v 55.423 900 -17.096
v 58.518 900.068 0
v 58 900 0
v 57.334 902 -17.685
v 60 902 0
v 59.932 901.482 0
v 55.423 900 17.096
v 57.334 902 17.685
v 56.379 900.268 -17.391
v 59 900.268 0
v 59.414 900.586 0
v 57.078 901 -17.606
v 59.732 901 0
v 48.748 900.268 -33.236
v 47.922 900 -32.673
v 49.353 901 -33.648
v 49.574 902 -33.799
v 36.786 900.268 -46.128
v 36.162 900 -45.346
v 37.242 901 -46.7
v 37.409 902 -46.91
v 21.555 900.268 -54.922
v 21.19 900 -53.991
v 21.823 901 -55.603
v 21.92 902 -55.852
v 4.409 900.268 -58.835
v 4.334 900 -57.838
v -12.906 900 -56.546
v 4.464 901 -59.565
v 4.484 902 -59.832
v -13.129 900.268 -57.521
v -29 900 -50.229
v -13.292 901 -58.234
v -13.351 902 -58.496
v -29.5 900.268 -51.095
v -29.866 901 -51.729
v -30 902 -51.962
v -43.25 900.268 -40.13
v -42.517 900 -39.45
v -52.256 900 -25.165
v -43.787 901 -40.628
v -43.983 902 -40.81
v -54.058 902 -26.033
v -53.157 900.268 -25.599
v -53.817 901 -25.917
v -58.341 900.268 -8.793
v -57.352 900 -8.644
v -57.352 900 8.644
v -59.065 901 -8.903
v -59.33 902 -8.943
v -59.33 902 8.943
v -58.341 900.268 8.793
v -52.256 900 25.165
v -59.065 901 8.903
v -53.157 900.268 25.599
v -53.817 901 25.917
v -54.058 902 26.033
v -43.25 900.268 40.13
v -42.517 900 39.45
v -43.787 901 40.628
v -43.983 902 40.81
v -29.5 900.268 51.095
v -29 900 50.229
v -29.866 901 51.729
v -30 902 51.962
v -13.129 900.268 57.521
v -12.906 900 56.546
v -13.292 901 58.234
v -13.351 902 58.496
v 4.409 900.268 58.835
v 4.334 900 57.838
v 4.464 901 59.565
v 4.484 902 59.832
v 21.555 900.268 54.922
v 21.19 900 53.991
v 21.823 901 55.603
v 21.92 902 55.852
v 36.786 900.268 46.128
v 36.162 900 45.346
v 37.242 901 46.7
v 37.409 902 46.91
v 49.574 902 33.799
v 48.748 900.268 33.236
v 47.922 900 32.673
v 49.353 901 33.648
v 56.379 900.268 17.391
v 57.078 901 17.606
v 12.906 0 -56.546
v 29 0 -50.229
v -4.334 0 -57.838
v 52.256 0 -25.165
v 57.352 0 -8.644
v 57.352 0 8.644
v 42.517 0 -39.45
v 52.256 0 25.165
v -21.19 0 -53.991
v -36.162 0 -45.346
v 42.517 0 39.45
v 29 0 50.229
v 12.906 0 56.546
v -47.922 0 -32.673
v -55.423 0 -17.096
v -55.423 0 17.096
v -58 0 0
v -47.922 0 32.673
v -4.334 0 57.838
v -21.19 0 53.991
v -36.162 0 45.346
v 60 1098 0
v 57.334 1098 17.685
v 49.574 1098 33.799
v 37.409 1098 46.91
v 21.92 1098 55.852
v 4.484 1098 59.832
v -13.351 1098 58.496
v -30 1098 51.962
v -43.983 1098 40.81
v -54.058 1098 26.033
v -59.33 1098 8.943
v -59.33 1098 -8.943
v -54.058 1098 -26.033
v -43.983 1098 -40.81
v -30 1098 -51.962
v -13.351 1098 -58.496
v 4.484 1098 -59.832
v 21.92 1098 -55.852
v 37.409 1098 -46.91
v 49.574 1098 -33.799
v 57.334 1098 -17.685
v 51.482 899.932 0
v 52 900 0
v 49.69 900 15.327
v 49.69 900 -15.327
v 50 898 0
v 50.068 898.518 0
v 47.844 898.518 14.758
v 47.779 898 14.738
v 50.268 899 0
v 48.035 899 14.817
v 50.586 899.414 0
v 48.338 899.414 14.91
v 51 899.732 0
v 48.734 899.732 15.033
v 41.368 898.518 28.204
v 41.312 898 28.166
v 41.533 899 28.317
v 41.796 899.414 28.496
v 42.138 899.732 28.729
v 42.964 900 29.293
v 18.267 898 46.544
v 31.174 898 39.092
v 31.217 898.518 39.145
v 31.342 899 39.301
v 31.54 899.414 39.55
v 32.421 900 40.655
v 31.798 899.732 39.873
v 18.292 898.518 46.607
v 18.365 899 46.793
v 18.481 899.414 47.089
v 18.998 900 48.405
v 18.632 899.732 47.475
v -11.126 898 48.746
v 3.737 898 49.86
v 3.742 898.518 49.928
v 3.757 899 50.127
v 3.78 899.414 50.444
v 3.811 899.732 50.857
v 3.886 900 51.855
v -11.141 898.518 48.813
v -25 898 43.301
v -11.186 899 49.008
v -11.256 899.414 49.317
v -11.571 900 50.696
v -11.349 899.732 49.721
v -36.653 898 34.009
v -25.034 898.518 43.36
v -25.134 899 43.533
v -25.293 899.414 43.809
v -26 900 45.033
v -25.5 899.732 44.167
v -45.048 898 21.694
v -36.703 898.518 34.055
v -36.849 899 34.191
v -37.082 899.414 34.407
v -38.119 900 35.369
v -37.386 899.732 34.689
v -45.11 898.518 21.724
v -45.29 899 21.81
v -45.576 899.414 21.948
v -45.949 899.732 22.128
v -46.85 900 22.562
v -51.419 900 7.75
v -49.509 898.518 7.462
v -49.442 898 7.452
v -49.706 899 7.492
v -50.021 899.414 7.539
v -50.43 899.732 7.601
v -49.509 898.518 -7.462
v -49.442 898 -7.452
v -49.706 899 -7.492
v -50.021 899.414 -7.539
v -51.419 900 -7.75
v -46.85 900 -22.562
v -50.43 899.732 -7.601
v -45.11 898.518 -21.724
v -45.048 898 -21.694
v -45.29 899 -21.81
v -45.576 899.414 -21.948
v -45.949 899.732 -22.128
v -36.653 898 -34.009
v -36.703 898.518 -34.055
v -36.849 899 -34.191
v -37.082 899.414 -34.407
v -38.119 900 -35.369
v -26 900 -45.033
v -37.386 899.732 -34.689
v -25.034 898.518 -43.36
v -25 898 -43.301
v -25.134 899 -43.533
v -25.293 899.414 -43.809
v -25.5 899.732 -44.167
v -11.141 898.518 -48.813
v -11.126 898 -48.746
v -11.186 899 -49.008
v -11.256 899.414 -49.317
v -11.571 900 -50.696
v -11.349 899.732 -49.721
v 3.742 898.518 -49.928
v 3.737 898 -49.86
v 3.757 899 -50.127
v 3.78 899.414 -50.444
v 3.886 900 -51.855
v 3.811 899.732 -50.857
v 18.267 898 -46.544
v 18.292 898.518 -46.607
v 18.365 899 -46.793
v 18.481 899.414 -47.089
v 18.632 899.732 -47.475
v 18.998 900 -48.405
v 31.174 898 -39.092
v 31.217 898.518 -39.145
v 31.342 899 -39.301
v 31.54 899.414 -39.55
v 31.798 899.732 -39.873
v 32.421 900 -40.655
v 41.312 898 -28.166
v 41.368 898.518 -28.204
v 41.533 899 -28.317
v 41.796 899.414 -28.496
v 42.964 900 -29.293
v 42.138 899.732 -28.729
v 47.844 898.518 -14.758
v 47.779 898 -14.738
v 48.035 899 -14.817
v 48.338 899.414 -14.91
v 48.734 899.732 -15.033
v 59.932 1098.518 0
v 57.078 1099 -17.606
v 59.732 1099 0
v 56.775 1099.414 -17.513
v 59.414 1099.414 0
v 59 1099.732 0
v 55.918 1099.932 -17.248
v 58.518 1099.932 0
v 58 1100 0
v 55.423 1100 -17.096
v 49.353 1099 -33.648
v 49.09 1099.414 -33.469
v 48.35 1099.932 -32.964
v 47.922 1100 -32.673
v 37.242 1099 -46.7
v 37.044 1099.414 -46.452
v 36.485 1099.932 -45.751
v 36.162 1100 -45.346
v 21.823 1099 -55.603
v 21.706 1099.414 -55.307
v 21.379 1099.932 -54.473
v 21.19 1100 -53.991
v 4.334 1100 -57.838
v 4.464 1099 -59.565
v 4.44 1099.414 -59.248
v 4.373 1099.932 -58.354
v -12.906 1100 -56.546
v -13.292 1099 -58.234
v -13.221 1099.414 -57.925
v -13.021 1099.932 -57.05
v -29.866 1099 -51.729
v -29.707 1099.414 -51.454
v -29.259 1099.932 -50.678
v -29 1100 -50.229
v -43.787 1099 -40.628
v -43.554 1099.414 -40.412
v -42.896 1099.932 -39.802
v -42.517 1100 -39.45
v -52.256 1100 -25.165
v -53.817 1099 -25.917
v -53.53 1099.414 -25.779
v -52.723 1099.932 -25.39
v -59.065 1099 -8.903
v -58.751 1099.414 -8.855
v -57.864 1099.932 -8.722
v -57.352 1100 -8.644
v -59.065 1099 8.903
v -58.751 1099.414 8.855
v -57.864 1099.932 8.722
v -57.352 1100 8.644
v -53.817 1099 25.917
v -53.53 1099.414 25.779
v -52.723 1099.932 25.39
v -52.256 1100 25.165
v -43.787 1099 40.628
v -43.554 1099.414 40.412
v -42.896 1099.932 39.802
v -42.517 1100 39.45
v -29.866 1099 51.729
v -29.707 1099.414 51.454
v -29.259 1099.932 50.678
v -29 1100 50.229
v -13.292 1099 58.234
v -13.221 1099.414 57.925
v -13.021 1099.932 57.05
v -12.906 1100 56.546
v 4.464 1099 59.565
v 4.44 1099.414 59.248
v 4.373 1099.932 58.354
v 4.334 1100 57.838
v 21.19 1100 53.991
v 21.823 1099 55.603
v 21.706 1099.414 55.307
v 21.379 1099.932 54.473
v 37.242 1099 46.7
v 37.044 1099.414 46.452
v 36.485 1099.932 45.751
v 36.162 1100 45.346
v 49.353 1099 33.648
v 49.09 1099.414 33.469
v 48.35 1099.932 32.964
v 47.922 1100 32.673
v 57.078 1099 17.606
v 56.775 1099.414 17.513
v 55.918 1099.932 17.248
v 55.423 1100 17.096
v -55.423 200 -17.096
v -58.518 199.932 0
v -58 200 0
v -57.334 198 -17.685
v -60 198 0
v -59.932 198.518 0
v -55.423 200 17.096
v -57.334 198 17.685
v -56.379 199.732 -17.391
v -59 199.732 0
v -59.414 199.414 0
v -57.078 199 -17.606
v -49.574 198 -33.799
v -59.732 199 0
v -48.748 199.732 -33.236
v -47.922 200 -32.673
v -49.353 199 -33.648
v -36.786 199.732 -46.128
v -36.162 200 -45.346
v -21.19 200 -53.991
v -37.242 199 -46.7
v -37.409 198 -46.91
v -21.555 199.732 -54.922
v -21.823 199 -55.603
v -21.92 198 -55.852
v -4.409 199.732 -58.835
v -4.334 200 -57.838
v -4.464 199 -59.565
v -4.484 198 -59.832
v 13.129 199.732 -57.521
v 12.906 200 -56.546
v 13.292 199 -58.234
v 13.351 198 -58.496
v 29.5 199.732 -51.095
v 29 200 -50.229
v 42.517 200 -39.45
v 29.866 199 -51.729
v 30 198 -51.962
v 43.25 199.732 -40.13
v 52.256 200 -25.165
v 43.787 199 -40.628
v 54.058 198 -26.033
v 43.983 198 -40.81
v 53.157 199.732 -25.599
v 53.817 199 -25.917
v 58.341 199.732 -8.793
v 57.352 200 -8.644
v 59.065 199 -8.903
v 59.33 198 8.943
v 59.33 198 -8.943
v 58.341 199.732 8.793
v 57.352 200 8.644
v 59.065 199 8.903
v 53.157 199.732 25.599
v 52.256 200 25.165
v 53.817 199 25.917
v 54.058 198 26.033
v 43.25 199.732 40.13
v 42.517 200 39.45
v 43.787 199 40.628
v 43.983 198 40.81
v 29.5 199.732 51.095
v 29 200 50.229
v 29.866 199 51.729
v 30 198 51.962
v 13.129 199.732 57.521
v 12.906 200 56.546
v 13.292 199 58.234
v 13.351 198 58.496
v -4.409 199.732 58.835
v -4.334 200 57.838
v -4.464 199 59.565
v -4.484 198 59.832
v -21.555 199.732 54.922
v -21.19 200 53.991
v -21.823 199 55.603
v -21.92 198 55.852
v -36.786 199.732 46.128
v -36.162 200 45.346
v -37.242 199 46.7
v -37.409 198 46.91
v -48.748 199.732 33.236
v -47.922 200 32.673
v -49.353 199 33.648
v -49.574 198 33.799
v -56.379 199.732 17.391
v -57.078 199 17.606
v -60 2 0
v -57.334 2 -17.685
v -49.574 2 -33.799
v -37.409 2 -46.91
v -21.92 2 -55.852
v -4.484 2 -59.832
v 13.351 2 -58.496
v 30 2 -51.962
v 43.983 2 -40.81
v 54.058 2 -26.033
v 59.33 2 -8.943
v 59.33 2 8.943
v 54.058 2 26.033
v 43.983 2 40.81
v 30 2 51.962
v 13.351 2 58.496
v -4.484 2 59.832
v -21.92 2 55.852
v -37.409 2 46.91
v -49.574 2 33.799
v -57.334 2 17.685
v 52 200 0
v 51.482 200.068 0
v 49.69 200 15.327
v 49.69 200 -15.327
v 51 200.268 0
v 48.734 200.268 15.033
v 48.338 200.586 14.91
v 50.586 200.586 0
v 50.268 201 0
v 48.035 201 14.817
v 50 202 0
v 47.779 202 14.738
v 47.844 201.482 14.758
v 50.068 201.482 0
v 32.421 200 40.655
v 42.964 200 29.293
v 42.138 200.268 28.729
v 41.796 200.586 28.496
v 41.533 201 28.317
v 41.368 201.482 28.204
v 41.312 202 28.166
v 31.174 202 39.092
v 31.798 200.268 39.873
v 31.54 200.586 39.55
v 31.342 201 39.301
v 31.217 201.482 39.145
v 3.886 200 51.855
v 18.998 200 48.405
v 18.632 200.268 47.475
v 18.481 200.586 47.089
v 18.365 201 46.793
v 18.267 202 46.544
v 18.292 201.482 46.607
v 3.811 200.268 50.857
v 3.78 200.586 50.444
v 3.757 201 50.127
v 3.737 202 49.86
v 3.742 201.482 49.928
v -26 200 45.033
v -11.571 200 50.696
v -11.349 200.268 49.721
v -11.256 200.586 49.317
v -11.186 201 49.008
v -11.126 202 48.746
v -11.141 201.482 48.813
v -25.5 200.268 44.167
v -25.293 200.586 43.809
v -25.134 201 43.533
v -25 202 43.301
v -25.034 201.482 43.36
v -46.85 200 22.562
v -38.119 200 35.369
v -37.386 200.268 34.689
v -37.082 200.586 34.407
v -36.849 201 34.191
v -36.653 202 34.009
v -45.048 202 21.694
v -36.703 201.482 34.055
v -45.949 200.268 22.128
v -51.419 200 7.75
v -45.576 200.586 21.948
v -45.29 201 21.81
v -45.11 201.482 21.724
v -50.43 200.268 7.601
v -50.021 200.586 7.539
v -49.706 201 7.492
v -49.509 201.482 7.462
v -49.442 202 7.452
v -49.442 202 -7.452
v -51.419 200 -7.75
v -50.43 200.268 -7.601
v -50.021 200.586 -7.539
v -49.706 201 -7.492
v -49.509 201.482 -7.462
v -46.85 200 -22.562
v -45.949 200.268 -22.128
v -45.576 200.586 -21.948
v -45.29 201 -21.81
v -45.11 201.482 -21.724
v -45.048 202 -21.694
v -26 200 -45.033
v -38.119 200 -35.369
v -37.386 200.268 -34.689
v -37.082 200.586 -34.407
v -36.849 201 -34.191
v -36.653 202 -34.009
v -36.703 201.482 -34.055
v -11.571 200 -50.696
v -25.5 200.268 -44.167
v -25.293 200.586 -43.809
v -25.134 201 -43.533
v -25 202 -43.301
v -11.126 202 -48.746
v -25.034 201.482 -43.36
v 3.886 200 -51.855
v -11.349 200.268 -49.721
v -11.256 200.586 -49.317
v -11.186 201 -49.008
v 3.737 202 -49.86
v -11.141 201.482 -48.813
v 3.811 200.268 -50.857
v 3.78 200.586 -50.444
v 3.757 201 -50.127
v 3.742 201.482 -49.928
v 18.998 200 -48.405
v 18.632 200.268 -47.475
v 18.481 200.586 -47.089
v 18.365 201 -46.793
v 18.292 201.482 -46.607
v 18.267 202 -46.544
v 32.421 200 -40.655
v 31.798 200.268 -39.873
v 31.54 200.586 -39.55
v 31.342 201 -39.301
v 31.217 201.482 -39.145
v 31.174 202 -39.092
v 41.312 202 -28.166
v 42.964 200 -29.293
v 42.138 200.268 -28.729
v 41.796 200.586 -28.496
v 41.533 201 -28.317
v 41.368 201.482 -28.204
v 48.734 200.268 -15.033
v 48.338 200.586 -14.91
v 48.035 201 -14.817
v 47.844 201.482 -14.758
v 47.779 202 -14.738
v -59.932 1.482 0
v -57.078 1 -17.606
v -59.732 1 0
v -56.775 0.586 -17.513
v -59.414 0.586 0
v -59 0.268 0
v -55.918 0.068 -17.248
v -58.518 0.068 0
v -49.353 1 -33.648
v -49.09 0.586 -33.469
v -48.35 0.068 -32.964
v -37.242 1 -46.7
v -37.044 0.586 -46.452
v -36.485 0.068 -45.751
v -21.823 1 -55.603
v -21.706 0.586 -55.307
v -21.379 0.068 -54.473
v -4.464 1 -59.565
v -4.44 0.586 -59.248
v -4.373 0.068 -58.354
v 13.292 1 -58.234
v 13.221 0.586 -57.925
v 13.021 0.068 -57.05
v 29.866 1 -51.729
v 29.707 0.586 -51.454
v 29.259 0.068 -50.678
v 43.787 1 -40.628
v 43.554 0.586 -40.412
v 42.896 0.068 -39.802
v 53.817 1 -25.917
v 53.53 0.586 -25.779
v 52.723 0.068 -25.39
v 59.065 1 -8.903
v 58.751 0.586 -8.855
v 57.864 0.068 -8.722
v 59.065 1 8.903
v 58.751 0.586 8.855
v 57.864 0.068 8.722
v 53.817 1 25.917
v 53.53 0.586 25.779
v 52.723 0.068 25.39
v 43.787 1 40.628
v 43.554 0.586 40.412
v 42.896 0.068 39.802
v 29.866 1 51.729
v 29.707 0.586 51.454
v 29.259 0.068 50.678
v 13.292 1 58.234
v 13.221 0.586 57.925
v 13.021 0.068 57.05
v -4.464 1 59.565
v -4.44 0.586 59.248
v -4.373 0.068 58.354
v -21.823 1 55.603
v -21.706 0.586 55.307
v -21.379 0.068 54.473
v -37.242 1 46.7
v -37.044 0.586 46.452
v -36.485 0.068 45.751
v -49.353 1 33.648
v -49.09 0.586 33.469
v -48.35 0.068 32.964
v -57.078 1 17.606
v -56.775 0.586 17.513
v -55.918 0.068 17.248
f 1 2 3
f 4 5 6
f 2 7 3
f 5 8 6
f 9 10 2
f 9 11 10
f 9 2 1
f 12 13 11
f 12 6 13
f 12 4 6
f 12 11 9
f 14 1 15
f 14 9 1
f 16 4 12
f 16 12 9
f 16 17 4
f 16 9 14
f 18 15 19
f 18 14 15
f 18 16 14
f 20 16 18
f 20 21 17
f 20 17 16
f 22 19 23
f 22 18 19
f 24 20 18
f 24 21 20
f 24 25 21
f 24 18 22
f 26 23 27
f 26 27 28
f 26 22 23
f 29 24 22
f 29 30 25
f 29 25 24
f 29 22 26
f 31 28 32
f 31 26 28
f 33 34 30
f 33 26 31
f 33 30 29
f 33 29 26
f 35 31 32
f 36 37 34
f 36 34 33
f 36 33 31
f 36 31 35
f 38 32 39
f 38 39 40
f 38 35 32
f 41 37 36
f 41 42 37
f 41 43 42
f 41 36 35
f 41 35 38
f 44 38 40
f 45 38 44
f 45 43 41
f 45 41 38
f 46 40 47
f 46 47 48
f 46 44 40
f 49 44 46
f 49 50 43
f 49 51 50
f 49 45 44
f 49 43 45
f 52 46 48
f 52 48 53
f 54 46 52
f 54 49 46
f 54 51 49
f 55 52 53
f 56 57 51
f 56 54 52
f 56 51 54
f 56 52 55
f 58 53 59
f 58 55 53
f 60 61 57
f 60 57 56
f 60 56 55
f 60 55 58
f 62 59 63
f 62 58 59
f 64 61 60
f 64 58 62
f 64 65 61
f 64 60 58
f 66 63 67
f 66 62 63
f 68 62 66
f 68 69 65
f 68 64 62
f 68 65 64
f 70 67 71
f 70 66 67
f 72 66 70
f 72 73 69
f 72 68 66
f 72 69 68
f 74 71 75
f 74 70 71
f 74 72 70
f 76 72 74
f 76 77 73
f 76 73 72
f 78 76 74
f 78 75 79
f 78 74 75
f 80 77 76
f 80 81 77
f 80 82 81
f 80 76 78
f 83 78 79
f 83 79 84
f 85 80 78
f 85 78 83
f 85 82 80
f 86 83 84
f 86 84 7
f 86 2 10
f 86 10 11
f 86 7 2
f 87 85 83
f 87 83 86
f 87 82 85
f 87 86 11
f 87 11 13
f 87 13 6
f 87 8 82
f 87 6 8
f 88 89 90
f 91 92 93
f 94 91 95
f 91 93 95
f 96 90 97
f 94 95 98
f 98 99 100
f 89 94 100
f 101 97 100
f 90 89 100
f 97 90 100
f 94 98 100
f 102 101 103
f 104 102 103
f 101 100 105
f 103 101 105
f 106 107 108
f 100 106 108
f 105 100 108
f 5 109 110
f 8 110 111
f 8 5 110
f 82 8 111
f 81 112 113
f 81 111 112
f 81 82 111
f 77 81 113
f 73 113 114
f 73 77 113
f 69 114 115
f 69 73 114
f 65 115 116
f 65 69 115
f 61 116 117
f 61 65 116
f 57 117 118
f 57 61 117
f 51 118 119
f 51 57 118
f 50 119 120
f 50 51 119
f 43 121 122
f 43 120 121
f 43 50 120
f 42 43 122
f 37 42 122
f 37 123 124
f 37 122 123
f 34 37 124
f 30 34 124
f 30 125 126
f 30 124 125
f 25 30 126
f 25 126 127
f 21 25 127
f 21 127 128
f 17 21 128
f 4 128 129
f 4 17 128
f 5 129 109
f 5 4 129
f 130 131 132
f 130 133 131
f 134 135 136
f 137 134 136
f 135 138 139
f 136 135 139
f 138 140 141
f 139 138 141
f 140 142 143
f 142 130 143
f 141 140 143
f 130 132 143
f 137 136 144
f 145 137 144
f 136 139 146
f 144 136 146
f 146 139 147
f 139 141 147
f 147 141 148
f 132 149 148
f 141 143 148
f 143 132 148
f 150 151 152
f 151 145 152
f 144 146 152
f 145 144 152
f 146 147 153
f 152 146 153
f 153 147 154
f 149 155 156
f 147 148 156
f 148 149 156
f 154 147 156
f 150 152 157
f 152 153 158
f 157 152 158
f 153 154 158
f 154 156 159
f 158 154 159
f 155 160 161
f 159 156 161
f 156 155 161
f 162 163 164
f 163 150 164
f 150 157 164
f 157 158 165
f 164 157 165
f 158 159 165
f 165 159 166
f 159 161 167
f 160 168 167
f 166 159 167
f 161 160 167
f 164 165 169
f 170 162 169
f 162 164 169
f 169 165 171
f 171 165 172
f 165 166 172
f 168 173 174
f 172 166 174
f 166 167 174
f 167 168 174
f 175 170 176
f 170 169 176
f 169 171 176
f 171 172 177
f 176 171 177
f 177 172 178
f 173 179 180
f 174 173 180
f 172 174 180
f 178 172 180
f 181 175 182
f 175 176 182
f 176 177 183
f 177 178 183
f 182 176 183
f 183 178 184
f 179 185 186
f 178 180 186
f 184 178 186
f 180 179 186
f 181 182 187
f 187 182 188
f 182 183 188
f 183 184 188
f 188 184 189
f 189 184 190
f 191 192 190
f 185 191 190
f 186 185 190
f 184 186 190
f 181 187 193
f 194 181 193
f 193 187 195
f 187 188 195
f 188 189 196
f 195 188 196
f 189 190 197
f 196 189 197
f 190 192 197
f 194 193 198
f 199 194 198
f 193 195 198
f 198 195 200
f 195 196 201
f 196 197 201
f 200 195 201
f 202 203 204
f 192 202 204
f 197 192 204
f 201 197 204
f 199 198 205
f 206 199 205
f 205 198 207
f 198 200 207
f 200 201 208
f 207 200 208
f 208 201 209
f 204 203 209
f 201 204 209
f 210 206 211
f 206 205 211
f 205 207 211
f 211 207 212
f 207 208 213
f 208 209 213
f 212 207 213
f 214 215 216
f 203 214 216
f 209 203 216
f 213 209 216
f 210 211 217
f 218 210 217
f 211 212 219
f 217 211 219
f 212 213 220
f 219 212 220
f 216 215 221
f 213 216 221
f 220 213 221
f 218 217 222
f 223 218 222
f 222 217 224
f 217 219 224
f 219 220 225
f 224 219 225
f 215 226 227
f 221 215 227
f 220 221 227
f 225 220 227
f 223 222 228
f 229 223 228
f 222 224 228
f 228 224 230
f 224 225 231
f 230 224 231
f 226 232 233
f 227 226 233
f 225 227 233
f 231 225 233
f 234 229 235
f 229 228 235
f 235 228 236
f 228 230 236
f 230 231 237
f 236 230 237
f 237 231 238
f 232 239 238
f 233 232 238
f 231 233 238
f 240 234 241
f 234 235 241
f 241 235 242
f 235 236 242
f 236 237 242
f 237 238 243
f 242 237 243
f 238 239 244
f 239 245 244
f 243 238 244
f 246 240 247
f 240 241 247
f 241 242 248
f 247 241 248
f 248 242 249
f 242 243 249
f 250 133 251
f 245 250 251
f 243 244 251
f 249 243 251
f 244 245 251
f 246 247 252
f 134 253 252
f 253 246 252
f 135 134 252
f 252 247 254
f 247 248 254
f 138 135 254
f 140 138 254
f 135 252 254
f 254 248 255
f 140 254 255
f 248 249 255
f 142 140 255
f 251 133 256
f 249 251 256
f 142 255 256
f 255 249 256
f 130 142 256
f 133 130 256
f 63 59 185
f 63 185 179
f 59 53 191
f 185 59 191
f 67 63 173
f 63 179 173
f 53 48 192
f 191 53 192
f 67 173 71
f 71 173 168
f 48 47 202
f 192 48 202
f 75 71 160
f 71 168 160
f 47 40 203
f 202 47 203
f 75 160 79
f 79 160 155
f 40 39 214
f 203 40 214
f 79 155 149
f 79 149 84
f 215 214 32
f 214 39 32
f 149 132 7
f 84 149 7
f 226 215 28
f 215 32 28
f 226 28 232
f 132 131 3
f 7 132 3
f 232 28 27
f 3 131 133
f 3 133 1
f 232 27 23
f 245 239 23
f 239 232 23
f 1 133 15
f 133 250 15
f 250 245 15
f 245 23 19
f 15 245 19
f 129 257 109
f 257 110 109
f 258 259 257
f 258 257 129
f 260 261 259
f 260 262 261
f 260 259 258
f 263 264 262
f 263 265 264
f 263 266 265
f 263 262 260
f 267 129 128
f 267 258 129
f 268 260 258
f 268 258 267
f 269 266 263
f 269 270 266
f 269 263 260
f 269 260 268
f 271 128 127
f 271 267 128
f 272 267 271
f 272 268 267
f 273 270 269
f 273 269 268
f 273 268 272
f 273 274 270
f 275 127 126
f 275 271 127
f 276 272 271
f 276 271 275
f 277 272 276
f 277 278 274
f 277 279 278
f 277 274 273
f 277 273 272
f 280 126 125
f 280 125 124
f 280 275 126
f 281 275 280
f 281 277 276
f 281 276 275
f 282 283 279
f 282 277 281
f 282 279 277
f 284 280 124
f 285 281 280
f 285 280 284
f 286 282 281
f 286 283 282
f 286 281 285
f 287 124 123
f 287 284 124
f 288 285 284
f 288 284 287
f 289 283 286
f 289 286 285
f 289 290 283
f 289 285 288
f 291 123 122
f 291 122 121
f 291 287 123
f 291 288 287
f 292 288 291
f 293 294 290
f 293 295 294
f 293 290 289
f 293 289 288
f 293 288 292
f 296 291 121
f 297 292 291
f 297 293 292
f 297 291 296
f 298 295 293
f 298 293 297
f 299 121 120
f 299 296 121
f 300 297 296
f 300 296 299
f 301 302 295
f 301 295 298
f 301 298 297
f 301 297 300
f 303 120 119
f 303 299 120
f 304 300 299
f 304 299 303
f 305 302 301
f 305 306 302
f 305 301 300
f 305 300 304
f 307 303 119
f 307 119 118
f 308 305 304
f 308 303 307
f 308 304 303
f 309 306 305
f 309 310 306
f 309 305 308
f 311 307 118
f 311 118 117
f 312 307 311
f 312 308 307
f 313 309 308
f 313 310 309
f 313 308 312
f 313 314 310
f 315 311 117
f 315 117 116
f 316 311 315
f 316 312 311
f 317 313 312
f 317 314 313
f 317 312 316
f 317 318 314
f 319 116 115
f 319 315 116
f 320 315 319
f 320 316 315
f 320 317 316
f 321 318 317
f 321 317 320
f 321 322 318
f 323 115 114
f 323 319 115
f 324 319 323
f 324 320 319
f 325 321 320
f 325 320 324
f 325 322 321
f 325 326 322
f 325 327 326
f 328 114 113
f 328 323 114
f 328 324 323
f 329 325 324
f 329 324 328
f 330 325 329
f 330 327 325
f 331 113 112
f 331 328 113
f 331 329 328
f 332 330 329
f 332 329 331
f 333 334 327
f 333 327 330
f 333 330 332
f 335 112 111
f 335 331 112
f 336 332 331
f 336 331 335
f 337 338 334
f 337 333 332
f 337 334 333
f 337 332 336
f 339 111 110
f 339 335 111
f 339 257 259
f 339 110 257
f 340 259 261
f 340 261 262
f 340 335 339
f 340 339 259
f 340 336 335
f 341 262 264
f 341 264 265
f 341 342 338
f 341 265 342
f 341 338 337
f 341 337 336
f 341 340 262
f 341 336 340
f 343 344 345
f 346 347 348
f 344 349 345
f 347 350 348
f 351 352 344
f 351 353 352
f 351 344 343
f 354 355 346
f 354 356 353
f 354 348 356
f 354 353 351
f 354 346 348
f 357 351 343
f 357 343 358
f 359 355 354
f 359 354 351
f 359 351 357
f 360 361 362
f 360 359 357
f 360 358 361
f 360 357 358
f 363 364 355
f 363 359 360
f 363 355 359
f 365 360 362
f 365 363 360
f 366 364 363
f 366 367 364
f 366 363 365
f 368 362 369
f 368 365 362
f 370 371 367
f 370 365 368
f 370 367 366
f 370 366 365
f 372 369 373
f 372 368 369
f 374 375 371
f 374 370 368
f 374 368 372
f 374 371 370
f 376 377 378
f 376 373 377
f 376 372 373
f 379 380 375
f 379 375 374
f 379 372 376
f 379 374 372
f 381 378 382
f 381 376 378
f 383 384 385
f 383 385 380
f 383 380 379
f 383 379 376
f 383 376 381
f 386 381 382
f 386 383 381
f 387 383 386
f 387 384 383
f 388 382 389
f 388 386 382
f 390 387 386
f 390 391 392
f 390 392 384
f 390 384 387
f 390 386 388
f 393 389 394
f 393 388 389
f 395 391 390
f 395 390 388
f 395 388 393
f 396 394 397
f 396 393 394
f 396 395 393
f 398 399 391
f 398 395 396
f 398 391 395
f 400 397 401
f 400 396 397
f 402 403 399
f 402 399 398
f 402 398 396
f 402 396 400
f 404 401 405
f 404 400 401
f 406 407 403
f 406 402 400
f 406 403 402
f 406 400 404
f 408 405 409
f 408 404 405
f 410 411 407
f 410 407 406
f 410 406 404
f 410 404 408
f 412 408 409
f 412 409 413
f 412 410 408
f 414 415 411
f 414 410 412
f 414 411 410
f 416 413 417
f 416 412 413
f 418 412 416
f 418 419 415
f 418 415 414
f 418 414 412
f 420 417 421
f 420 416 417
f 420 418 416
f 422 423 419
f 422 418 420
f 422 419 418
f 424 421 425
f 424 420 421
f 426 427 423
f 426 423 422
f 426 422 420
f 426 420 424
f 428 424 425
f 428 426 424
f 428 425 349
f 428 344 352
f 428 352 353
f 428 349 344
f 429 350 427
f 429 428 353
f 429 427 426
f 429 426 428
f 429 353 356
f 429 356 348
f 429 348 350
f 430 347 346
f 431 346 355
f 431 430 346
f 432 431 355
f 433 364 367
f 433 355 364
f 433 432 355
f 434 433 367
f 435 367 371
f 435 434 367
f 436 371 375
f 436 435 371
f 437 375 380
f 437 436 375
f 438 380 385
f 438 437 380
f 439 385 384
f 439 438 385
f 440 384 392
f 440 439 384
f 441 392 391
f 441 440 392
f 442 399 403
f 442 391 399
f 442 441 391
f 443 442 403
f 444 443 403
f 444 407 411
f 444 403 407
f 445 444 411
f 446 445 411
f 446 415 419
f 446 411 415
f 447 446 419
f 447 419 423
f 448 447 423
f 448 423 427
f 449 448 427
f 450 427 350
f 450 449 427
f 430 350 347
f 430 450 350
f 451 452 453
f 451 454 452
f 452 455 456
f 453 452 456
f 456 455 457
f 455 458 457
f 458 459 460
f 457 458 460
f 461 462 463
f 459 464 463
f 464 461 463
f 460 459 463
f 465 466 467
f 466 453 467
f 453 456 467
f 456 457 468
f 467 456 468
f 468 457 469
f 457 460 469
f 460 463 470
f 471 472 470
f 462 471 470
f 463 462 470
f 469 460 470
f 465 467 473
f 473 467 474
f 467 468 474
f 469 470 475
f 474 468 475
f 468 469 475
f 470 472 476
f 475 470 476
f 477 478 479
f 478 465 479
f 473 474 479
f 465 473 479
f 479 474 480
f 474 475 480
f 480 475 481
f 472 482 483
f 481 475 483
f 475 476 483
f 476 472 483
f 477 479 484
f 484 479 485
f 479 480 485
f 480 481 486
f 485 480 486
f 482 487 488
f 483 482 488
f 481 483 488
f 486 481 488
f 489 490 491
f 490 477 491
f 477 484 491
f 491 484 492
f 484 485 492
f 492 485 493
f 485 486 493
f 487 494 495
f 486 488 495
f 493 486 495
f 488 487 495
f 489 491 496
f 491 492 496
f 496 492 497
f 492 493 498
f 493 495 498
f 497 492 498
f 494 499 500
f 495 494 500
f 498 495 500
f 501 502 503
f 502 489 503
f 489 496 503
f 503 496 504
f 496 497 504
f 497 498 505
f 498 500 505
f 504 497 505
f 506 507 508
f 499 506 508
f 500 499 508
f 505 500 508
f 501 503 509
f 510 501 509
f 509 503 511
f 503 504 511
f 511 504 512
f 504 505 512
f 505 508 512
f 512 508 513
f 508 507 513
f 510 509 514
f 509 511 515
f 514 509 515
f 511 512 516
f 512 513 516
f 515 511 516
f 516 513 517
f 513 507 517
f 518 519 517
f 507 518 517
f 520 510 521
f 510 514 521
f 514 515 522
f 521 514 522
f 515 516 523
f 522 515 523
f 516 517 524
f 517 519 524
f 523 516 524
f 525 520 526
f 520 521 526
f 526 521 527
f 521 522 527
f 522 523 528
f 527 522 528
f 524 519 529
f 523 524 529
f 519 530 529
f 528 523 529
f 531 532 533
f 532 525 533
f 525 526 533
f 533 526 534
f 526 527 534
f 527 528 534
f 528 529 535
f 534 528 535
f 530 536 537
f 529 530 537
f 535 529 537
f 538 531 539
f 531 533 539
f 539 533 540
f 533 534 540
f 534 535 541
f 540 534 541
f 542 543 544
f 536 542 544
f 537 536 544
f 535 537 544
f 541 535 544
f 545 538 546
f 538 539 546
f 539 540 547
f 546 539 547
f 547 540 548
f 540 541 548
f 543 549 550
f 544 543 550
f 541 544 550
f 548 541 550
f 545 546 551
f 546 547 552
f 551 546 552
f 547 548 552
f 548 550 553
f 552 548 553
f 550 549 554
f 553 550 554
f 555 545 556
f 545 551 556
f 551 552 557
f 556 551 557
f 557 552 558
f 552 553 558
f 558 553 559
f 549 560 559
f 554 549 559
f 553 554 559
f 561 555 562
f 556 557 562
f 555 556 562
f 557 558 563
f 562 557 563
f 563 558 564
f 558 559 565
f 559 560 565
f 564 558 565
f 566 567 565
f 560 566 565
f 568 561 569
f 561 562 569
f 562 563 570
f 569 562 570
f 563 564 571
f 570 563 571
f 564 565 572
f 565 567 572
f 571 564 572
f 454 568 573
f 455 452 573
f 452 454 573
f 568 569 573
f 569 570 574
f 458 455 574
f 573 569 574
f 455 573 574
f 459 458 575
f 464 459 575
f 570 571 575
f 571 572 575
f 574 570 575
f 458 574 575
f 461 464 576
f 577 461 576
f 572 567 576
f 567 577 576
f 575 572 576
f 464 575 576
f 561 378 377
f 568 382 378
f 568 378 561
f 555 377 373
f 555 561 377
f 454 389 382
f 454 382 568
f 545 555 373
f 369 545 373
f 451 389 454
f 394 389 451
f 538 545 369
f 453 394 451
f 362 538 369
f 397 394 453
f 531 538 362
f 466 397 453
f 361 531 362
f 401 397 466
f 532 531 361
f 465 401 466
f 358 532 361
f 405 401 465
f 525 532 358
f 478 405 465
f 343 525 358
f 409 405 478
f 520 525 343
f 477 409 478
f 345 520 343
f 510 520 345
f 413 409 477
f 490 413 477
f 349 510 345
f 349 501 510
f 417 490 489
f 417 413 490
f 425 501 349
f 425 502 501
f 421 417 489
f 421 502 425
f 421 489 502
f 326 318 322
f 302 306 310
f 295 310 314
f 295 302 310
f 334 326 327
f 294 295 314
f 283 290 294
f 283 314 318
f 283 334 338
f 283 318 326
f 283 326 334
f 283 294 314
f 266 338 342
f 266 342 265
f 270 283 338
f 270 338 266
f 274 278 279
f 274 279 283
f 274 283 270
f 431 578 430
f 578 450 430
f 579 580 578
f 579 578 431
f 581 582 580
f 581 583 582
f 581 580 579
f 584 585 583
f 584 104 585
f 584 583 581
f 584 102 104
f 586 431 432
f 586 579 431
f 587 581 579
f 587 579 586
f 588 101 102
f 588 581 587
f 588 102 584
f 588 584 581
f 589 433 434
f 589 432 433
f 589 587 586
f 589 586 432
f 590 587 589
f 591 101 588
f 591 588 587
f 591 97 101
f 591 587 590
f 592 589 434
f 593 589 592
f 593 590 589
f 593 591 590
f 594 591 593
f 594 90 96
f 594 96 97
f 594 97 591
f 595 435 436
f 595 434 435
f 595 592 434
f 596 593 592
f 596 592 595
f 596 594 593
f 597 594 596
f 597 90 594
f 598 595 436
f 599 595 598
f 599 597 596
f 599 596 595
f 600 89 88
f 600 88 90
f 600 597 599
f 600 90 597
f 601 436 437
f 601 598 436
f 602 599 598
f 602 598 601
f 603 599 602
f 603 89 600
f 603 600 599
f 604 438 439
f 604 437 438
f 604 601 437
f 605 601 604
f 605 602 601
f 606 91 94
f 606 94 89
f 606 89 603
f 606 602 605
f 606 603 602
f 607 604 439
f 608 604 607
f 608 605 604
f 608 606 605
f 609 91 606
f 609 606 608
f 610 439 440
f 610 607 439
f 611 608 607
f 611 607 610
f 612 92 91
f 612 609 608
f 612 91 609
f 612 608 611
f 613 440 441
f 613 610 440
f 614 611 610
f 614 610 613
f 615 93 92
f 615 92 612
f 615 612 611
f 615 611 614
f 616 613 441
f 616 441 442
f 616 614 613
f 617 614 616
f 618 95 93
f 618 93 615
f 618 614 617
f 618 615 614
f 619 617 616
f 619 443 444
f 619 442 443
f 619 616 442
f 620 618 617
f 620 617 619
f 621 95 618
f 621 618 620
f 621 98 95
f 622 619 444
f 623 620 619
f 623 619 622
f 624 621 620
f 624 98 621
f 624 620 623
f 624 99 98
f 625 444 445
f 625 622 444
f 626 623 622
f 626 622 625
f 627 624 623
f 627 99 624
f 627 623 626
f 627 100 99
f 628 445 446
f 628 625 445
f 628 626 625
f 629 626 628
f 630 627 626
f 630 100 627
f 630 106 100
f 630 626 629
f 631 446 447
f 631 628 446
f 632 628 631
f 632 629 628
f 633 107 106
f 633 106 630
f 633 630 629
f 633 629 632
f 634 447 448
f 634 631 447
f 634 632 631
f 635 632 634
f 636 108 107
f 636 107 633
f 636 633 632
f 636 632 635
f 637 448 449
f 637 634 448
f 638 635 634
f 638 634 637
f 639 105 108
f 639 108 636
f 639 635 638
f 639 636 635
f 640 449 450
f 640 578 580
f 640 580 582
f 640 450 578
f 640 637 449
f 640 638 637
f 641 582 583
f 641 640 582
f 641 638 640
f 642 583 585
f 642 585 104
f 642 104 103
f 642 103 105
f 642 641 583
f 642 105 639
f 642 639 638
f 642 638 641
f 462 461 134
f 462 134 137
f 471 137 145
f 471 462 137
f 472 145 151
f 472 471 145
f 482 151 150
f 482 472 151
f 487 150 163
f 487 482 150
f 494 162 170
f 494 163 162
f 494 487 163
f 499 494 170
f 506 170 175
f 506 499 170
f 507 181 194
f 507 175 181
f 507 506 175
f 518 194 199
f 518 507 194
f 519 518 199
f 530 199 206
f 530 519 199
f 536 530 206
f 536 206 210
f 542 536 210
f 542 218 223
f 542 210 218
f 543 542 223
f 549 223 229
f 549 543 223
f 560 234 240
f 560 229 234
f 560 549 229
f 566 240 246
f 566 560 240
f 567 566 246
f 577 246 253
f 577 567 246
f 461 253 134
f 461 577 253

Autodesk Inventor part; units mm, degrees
ref_plane "YZ Plane" through (0, 0, 0) normal (1, 0, 0) x (0, 1, 0)
ref_plane "XZ Plane" through (0, 0, 0) normal (0, 1, 0) x (-1, 0, 0)
ref_plane "XY Plane" through (0, 0, 0) normal (0, 0, 1) x (1, 0, 0)
sketch "Sketch1" plane through (0, 0, 0) normal (0, 1, 0) x (-1, 0, 0)
  circle A0 centre (0, 0) radius 60
  dimension "d0" = 120
extrude "Extrusion1" add sketch "Sketch1" along normal blind 200
sketch "Sketch2" plane through (0, 200, 0) normal (0, 1, 0) x (1, 0, 0)
  circle A0 centre (0, 0) radius 50
  dimension "d3" = 100
extrude "Extrusion2" add sketch "Sketch2" along normal blind 700
sketch "Sketch3" plane through (0, 900, 0) normal (0, 1, 0) x (1, 0, 0)
  circle A0 centre (0, 0) radius 60
  dimension "d6" = 120
extrude "Extrusion3" add sketch "Sketch3" along normal blind 200
fillet "Fillet1" radius 2 1 edges at (60, 200, 0)
fillet "Fillet2" radius 2 1 edges at (-50, 200, 0)
fillet "Fillet3" radius 2 2 edges at (-60, 900, 0) (-50, 900, 0)
fillet "Fillet4" radius 2 1 edges at (-60, 1100, 0)
fillet "Fillet5" radius 2 1 edges at (60, 0, 0)
equation "\"d1\" = 2 * Grip"
equation "\"d3\" = Grip"
equation "\"d4\" = 7 * Grip"
equation "\"d7\" = 2 * Grip"
equation "\"Grip\" = 100"
properties part number "mallet_new" material "Wood (Birch)"
